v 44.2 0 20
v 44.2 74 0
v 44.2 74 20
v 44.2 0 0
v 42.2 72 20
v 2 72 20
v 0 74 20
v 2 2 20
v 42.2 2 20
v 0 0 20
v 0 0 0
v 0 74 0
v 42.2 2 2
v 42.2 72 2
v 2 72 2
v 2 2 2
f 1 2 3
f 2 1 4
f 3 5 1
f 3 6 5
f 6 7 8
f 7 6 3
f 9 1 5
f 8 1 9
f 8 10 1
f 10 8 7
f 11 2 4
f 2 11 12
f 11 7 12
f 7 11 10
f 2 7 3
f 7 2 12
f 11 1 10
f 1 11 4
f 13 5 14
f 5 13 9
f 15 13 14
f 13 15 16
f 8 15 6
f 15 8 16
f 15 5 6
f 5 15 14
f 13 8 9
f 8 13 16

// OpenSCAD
difference() {
    cube([44.2, 74, 20]);
    translate([2,2,2]){
        cube([40.2, 70, 18]);
    }
}
